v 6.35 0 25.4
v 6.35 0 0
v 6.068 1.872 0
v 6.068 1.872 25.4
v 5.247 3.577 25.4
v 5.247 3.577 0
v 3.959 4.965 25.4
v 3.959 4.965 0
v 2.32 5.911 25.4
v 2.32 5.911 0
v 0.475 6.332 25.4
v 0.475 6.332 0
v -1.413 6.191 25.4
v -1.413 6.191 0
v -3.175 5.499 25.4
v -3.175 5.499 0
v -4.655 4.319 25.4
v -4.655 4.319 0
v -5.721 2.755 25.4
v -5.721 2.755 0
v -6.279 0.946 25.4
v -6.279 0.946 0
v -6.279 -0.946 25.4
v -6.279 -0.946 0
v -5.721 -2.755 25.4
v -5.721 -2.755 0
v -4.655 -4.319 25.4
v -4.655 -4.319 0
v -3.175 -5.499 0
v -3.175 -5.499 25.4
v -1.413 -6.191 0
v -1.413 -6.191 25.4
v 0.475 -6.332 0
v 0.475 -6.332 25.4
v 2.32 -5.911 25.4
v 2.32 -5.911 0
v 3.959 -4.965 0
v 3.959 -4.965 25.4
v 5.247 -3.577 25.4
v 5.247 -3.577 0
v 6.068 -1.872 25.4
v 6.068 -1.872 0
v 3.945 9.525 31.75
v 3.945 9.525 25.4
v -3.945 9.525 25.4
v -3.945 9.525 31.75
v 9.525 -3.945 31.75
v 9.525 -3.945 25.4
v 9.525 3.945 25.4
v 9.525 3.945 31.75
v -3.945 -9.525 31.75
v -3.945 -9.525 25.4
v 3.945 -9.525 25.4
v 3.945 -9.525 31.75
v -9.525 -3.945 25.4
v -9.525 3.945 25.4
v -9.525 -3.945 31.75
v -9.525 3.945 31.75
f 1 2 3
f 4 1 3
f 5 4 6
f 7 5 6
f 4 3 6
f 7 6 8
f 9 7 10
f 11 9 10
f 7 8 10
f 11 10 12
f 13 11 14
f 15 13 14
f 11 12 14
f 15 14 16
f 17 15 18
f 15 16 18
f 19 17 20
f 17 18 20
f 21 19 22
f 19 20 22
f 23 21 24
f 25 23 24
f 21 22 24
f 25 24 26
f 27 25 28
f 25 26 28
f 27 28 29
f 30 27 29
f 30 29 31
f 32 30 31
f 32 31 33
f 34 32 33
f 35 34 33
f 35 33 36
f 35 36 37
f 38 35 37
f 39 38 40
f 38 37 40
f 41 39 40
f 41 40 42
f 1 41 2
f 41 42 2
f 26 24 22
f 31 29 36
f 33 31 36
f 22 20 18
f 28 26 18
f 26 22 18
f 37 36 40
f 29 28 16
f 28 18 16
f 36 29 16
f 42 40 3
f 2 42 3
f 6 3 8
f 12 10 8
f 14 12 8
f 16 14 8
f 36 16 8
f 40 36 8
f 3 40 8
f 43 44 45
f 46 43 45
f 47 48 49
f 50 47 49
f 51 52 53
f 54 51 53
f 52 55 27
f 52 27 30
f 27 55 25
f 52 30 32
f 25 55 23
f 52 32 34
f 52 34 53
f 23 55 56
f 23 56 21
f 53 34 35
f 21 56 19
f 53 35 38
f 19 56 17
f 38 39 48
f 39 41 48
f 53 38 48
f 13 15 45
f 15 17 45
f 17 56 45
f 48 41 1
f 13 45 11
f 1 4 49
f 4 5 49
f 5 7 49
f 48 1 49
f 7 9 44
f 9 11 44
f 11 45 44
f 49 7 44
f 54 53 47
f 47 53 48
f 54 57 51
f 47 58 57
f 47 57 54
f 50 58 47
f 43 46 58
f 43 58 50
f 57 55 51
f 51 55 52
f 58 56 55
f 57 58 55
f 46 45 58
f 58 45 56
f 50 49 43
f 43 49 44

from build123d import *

# Parameters (mm, degrees)
ESQUISSE1_R        = 6.35
BOSS_EXTRU_1_DEPTH = 25.4
BOSS_EXTRU_2_DEPTH = 6.35


with BuildPart() as part:
    # Esquisse1 → Boss.-Extru.1 (new body)
    with BuildSketch(Plane.XY):
        Circle(ESQUISSE1_R)
    extrude(amount=BOSS_EXTRU_1_DEPTH)

    # Esquisse2 → Boss.-Extru.2 (add)
    with BuildSketch(Plane.XY.offset(25.4)):
        Polygon((9.525, 3.945384182), (3.945384182, 9.525), (-3.945384182, 9.525), (-9.525, 3.945384182), (-9.525, -3.945384182), (-3.945384182, -9.525), (3.945384182, -9.525), (9.525, -3.945384182), align=None)
    extrude(amount=BOSS_EXTRU_2_DEPTH)


solid = part.part
